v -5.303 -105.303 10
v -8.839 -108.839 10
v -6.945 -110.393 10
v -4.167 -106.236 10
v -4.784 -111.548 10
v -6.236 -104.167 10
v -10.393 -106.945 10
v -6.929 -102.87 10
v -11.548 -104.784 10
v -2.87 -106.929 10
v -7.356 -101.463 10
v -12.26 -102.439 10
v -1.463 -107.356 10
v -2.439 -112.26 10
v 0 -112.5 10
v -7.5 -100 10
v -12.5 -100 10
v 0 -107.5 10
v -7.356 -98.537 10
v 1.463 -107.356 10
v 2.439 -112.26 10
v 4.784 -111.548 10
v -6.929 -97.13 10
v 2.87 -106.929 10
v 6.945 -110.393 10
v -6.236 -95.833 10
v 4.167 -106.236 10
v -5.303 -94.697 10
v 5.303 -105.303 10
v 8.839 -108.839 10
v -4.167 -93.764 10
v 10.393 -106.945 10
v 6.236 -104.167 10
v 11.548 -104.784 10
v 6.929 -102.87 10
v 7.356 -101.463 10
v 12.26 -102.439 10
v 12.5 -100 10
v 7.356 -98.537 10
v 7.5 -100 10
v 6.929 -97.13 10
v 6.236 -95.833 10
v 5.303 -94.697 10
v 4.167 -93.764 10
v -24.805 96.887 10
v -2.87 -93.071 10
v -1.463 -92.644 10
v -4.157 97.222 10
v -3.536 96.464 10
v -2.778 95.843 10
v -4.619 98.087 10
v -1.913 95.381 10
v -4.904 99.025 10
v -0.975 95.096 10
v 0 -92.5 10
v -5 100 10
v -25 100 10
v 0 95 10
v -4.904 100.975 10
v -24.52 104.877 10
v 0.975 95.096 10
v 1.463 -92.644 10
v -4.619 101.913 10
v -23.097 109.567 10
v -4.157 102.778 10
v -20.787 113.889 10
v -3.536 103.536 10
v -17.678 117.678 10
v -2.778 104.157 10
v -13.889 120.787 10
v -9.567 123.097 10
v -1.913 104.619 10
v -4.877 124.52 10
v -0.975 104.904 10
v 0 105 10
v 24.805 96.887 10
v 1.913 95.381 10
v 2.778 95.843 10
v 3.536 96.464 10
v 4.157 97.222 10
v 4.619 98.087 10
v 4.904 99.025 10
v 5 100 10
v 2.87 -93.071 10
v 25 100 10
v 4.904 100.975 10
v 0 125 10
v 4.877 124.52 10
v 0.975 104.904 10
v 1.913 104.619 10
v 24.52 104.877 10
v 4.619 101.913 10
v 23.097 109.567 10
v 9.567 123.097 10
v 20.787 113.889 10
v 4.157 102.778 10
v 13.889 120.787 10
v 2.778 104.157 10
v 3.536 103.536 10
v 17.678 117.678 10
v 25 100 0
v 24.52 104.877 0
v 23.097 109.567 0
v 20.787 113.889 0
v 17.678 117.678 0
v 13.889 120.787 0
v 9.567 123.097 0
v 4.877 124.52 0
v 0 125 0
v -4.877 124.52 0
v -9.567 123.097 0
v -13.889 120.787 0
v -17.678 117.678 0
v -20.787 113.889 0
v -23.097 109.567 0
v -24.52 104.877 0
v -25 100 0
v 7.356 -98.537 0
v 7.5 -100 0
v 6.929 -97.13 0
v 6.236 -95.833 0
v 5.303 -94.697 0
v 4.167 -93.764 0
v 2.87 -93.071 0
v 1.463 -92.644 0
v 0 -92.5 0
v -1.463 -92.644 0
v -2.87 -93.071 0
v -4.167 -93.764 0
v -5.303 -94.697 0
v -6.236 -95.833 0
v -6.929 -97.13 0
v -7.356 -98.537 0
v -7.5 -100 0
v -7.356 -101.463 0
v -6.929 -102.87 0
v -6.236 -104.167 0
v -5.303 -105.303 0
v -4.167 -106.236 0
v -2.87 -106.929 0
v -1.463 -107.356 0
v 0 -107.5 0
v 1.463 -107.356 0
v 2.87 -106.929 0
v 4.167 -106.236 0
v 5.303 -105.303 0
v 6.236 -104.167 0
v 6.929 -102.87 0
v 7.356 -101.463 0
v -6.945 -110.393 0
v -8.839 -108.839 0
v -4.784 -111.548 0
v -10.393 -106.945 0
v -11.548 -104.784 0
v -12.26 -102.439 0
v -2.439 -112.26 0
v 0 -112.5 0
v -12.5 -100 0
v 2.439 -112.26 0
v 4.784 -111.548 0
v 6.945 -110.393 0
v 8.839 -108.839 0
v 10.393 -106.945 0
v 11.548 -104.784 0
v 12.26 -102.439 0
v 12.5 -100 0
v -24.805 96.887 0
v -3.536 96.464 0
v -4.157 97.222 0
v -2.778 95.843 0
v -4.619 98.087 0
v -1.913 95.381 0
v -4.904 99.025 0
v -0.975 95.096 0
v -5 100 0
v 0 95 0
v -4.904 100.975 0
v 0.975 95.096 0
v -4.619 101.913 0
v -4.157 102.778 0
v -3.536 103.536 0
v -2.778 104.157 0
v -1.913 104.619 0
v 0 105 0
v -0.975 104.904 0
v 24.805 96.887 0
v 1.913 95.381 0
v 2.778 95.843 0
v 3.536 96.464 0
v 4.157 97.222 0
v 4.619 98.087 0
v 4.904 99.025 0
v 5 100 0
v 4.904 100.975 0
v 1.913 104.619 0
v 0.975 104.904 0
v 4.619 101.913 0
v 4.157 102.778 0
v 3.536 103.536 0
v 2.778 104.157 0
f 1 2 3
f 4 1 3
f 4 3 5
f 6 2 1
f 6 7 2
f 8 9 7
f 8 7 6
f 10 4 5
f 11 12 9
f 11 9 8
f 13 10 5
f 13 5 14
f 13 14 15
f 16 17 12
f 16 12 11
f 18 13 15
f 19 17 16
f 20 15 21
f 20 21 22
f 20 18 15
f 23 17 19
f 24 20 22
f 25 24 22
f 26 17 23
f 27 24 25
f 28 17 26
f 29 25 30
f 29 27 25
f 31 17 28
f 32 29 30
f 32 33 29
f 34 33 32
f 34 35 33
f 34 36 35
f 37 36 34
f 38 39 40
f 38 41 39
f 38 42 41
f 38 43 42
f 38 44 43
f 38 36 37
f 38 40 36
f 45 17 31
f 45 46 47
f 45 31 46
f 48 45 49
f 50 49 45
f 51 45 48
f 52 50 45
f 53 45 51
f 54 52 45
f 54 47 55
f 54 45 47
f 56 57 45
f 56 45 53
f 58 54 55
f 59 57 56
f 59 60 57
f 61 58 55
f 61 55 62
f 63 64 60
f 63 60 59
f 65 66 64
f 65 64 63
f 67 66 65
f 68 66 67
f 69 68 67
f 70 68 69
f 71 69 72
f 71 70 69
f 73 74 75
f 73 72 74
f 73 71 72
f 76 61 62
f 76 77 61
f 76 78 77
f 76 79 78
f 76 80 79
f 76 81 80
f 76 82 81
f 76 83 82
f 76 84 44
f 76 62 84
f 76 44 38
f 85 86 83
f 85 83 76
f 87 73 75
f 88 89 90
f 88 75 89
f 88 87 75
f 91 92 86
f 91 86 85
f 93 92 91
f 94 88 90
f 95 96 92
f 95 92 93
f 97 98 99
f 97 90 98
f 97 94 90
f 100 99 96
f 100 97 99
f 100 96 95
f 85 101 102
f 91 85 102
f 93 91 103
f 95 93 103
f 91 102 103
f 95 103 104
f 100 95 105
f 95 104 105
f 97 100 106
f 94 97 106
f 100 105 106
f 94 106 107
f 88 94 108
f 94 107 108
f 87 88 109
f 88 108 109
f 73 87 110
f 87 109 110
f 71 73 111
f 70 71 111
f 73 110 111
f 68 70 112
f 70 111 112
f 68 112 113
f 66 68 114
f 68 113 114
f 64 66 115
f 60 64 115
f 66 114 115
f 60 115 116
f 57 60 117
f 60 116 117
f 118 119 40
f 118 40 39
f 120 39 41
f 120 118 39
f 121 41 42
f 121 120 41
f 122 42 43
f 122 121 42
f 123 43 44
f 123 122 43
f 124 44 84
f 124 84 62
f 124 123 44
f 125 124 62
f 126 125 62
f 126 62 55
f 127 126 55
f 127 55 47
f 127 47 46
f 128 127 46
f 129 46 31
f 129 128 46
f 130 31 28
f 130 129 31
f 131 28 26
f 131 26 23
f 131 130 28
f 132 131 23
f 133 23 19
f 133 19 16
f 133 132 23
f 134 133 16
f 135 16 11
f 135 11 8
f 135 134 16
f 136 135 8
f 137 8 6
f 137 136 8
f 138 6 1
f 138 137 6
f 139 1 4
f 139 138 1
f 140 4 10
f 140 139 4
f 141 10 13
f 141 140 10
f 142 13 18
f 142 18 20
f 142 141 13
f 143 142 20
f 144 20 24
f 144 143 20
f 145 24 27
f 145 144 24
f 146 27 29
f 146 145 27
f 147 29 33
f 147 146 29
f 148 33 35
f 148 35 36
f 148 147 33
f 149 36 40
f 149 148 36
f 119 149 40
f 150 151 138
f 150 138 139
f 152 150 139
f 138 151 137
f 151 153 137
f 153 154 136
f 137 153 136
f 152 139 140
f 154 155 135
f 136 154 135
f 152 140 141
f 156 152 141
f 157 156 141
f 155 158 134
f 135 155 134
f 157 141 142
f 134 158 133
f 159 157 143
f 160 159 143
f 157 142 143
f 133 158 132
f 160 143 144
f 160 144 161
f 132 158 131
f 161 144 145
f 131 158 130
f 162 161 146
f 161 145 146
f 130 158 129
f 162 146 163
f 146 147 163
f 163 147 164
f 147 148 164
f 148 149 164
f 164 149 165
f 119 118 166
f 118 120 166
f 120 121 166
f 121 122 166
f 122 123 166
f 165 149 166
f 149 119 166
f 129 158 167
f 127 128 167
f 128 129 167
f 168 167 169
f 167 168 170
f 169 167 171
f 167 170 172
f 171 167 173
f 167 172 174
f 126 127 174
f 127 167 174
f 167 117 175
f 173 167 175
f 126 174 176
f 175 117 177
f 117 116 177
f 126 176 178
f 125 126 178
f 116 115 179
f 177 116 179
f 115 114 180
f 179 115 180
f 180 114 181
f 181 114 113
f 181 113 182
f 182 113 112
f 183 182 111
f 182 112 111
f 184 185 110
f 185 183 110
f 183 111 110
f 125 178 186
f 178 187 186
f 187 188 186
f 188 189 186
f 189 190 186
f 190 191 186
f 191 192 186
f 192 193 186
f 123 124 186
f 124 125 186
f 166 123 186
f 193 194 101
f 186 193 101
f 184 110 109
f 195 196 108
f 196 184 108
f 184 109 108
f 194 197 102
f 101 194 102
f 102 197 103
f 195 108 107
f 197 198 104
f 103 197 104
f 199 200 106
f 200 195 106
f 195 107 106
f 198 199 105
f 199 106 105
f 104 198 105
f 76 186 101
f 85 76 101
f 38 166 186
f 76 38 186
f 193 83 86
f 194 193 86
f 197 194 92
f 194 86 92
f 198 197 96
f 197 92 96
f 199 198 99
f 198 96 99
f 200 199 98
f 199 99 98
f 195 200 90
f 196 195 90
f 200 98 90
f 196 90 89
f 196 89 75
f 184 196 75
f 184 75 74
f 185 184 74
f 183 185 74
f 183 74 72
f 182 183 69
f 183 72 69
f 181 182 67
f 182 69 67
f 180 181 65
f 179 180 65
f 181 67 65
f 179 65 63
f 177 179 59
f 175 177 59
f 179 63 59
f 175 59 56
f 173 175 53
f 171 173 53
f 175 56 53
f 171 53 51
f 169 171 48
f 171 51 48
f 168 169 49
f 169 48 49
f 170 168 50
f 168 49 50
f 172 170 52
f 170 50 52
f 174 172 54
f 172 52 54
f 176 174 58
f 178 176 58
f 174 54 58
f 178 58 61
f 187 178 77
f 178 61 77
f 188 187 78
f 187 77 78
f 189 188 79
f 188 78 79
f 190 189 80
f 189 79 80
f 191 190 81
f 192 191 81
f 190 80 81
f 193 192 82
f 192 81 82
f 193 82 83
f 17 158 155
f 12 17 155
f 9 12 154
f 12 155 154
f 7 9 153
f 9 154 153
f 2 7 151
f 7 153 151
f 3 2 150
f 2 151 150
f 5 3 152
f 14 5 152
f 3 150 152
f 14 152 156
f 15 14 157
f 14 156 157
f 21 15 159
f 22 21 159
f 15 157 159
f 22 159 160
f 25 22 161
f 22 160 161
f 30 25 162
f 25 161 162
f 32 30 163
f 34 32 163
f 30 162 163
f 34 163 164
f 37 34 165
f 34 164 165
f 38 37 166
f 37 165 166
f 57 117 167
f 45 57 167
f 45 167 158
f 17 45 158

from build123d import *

# Parameters (mm, degrees)
SKETCH1_R           = 7.5
SKETCH1_R_2         = 13
BOSS_EXTRUDE1_DEPTH = 10
SKETCH2_R           = 13
SKETCH2_R_2         = 5
BOSS_EXTRUDE2_DEPTH = 10


with BuildPart() as part:
    # Sketch1 → Boss-Extrude1 (new body)
    with BuildSketch(Plane.XY):
        with BuildLine():
            ThreePointArc((25, 100), (0, 125), (-25, 100))
            Line((-25, 100), (-24.805447471, 96.887159533))
            Line((-24.805447471, 96.887159533), (-12.5, -100))
            ThreePointArc((-12.5, -100), (0, -112.5), (12.5, -100))
            Line((12.5, -100), (24.805447471, 96.887159533))
            Line((24.805447471, 96.887159533), (25, 100))
        make_face()
        with Locations((0, -100)):
            Circle(SKETCH1_R, mode=Mode.SUBTRACT)
        with Locations((0, 100)):
            Circle(SKETCH1_R_2, mode=Mode.SUBTRACT)
    extrude(amount=BOSS_EXTRUDE1_DEPTH)

    # Sketch2 → Boss-Extrude2 (add)
    with BuildSketch(Plane.XY.offset(10)):
        with Locations((0, 100)):
            Circle(SKETCH2_R)
        with Locations((0, 100)):
            Circle(SKETCH2_R_2, mode=Mode.SUBTRACT)
    extrude(amount=-BOSS_EXTRUDE2_DEPTH)


solid = part.part
